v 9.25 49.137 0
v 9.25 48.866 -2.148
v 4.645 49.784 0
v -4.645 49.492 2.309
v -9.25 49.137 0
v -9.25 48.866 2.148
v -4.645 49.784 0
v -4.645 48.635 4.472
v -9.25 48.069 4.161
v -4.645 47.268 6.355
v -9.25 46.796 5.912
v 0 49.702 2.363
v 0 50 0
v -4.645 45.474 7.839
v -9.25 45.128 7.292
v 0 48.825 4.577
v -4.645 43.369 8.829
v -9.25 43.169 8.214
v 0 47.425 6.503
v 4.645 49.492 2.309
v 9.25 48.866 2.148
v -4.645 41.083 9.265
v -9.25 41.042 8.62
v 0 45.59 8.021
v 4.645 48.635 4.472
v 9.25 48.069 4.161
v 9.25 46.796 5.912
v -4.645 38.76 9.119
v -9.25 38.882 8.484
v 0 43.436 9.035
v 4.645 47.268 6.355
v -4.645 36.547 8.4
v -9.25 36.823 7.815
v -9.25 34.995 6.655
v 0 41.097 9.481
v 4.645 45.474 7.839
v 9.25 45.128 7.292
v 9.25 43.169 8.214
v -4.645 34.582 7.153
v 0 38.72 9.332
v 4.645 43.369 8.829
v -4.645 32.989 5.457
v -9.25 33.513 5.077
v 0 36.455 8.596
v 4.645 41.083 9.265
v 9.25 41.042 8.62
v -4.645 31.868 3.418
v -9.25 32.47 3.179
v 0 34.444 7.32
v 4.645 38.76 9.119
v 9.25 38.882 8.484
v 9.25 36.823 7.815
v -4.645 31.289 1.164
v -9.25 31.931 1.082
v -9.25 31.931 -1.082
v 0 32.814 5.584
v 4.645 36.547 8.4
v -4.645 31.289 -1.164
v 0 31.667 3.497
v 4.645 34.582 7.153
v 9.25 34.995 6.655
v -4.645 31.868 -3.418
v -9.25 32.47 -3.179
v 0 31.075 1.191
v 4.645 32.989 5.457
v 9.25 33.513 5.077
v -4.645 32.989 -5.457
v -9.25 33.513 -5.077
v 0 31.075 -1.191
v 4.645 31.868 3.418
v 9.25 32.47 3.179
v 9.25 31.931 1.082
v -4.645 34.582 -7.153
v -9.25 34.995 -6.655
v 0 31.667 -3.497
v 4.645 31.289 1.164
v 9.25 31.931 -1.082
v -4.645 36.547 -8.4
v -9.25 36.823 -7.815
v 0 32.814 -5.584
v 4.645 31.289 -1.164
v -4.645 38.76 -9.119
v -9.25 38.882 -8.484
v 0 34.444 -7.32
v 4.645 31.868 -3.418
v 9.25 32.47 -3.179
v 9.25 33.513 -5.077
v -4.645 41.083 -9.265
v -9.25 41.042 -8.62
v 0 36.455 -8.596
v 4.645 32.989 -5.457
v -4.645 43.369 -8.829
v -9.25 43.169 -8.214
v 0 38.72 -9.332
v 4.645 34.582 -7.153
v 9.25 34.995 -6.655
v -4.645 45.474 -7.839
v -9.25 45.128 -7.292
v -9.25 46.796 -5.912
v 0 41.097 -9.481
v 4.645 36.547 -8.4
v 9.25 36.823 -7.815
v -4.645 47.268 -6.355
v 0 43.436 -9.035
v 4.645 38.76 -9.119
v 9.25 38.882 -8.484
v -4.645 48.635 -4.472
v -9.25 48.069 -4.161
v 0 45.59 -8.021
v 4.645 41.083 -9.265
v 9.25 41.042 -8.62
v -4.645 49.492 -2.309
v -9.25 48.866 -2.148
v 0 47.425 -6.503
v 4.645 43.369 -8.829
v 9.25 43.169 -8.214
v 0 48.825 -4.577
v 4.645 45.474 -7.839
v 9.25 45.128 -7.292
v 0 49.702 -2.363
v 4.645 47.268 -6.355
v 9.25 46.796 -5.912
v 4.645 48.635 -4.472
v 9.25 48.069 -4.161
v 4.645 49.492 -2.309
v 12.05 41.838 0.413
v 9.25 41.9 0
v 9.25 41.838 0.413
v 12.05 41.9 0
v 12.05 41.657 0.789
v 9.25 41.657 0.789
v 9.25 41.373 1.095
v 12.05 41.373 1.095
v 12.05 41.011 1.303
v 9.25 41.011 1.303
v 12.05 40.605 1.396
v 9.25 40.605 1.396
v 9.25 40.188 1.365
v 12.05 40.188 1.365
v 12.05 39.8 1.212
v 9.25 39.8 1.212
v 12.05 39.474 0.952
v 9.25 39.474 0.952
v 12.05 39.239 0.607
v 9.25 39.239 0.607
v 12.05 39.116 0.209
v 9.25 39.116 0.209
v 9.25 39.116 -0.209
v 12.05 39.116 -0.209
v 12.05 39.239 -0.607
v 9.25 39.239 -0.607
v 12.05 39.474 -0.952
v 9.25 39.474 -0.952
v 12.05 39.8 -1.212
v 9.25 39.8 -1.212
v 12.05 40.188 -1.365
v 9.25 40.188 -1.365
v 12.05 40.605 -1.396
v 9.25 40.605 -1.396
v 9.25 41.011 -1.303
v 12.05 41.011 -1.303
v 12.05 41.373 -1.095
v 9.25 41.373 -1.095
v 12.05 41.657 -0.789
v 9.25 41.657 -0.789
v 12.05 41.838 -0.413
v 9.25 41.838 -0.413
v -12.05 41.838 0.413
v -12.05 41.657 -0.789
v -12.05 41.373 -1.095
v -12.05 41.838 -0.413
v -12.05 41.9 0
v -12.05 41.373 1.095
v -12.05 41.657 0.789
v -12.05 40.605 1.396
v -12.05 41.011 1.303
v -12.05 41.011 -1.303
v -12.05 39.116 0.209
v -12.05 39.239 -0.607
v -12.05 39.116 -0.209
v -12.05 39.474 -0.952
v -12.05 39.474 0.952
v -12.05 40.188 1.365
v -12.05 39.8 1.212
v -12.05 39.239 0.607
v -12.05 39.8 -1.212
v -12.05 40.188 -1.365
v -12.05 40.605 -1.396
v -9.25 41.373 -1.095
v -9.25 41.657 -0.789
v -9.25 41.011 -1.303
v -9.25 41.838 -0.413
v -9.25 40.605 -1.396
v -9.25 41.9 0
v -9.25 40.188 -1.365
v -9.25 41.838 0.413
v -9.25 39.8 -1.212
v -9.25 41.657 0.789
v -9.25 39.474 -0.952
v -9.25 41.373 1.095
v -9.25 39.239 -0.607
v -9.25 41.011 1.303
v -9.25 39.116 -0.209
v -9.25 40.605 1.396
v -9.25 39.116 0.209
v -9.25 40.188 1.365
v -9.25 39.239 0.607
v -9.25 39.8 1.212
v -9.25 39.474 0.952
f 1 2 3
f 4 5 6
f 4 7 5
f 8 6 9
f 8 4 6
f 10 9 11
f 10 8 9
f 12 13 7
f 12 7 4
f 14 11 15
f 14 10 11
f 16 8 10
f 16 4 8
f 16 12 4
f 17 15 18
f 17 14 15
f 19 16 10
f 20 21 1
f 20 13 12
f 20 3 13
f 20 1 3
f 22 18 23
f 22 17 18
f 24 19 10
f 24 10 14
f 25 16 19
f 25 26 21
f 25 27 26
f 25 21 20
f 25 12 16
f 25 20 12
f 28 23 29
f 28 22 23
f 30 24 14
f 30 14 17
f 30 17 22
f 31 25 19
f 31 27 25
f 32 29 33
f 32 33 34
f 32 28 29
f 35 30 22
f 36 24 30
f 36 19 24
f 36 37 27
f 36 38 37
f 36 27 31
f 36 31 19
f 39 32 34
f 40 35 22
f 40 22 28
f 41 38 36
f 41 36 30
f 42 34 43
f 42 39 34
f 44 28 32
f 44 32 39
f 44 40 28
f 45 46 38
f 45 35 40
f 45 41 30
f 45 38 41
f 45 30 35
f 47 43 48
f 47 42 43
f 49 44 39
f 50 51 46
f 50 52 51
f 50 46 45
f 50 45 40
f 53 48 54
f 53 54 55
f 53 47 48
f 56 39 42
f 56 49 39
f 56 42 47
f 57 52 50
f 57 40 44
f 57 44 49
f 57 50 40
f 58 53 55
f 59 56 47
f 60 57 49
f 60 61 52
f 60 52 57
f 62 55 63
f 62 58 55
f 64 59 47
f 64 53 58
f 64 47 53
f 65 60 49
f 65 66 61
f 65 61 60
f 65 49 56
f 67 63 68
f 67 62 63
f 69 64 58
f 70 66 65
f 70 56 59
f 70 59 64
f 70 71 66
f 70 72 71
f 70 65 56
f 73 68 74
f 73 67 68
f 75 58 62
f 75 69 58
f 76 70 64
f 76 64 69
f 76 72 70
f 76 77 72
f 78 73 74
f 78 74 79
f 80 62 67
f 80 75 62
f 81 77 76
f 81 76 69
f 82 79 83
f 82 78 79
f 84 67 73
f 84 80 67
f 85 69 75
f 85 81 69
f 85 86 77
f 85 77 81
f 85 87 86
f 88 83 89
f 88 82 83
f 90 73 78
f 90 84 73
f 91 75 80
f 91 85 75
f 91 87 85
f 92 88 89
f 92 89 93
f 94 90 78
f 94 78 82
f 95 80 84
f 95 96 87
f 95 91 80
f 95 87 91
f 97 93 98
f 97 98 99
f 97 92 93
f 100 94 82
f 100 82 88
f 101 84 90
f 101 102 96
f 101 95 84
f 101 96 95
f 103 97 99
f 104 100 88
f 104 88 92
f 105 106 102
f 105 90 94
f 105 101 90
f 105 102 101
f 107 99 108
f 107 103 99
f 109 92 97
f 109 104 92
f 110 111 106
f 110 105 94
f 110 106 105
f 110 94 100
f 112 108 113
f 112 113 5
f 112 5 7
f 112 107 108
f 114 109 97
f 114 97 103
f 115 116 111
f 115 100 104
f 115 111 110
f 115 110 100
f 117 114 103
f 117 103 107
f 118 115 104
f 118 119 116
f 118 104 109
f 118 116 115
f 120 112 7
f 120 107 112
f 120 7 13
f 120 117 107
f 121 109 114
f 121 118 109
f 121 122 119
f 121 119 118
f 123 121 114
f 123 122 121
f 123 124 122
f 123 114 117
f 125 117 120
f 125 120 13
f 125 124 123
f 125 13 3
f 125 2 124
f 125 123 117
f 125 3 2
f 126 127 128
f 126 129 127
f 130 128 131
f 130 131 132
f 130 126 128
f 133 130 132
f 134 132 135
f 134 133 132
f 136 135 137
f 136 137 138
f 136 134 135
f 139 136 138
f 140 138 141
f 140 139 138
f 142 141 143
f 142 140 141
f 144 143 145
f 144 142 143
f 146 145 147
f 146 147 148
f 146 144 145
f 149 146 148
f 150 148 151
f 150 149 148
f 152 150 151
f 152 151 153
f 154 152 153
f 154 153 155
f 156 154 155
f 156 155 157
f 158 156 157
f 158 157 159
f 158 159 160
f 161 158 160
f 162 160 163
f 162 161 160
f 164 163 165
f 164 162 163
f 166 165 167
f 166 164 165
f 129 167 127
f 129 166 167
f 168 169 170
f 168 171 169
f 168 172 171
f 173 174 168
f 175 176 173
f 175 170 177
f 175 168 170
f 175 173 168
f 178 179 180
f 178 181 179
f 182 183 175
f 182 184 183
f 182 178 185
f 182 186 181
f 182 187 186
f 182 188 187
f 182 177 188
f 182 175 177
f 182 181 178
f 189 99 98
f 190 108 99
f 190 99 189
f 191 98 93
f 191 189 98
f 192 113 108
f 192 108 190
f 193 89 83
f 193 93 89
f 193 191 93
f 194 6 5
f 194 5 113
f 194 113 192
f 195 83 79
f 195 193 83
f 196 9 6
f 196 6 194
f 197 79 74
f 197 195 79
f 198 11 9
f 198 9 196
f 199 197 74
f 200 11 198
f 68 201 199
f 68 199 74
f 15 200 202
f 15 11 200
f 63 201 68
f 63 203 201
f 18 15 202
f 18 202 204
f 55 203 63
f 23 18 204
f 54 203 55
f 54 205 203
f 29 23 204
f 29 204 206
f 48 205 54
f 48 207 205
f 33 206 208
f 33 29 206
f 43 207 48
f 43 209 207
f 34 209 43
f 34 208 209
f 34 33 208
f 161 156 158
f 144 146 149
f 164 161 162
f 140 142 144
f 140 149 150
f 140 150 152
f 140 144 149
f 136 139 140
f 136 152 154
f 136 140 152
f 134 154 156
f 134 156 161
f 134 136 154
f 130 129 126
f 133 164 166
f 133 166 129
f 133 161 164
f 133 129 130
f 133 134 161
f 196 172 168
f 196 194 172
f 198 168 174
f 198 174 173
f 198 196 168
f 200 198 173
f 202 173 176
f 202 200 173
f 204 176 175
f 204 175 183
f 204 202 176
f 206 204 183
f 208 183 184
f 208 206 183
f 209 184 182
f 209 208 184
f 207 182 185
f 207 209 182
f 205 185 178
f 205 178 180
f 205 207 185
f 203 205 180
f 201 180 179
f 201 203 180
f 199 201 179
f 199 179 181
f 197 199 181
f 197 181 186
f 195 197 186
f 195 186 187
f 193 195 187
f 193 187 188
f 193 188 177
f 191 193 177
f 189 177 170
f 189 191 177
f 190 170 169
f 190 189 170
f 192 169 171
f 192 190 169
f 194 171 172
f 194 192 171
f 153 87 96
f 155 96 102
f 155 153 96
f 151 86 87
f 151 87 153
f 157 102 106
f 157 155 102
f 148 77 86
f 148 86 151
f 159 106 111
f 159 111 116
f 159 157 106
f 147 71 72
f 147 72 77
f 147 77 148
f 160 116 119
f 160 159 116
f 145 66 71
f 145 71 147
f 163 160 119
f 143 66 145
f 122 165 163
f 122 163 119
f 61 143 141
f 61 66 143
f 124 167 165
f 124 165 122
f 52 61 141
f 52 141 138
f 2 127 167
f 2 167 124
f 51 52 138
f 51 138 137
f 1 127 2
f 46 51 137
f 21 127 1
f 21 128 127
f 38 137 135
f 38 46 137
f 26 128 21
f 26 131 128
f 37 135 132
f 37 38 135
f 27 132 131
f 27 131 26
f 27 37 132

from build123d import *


with BuildPart() as part:
    # Sketch1 → Revolve1 (revolve)
    with BuildSketch(Plane.XY):
        with BuildLine():
            Line((9.25, 49.136926033), (9.25, 41.9))
            Line((9.25, 41.9), (12.05, 41.9))
            Line((12.05, 41.9), (12.05, 40.5))
            Line((12.05, 40.5), (9.25, 40.5))
            Line((9.25, 40.5), (-9.25, 40.5))
            Line((-9.25, 40.5), (-12.05, 40.5))
            Line((-12.05, 40.5), (-12.05, 41.9))
            Line((-12.05, 41.9), (-9.25, 41.9))
            Line((-9.25, 41.9), (-9.25, 49.136926033))
            ThreePointArc((-9.25, 49.136926033), (0, 50), (9.25, 49.136926033))
        make_face()
    revolve(axis=Axis((-9.25, 40.5, 0), (1, 0, 0)))


solid = part.part
